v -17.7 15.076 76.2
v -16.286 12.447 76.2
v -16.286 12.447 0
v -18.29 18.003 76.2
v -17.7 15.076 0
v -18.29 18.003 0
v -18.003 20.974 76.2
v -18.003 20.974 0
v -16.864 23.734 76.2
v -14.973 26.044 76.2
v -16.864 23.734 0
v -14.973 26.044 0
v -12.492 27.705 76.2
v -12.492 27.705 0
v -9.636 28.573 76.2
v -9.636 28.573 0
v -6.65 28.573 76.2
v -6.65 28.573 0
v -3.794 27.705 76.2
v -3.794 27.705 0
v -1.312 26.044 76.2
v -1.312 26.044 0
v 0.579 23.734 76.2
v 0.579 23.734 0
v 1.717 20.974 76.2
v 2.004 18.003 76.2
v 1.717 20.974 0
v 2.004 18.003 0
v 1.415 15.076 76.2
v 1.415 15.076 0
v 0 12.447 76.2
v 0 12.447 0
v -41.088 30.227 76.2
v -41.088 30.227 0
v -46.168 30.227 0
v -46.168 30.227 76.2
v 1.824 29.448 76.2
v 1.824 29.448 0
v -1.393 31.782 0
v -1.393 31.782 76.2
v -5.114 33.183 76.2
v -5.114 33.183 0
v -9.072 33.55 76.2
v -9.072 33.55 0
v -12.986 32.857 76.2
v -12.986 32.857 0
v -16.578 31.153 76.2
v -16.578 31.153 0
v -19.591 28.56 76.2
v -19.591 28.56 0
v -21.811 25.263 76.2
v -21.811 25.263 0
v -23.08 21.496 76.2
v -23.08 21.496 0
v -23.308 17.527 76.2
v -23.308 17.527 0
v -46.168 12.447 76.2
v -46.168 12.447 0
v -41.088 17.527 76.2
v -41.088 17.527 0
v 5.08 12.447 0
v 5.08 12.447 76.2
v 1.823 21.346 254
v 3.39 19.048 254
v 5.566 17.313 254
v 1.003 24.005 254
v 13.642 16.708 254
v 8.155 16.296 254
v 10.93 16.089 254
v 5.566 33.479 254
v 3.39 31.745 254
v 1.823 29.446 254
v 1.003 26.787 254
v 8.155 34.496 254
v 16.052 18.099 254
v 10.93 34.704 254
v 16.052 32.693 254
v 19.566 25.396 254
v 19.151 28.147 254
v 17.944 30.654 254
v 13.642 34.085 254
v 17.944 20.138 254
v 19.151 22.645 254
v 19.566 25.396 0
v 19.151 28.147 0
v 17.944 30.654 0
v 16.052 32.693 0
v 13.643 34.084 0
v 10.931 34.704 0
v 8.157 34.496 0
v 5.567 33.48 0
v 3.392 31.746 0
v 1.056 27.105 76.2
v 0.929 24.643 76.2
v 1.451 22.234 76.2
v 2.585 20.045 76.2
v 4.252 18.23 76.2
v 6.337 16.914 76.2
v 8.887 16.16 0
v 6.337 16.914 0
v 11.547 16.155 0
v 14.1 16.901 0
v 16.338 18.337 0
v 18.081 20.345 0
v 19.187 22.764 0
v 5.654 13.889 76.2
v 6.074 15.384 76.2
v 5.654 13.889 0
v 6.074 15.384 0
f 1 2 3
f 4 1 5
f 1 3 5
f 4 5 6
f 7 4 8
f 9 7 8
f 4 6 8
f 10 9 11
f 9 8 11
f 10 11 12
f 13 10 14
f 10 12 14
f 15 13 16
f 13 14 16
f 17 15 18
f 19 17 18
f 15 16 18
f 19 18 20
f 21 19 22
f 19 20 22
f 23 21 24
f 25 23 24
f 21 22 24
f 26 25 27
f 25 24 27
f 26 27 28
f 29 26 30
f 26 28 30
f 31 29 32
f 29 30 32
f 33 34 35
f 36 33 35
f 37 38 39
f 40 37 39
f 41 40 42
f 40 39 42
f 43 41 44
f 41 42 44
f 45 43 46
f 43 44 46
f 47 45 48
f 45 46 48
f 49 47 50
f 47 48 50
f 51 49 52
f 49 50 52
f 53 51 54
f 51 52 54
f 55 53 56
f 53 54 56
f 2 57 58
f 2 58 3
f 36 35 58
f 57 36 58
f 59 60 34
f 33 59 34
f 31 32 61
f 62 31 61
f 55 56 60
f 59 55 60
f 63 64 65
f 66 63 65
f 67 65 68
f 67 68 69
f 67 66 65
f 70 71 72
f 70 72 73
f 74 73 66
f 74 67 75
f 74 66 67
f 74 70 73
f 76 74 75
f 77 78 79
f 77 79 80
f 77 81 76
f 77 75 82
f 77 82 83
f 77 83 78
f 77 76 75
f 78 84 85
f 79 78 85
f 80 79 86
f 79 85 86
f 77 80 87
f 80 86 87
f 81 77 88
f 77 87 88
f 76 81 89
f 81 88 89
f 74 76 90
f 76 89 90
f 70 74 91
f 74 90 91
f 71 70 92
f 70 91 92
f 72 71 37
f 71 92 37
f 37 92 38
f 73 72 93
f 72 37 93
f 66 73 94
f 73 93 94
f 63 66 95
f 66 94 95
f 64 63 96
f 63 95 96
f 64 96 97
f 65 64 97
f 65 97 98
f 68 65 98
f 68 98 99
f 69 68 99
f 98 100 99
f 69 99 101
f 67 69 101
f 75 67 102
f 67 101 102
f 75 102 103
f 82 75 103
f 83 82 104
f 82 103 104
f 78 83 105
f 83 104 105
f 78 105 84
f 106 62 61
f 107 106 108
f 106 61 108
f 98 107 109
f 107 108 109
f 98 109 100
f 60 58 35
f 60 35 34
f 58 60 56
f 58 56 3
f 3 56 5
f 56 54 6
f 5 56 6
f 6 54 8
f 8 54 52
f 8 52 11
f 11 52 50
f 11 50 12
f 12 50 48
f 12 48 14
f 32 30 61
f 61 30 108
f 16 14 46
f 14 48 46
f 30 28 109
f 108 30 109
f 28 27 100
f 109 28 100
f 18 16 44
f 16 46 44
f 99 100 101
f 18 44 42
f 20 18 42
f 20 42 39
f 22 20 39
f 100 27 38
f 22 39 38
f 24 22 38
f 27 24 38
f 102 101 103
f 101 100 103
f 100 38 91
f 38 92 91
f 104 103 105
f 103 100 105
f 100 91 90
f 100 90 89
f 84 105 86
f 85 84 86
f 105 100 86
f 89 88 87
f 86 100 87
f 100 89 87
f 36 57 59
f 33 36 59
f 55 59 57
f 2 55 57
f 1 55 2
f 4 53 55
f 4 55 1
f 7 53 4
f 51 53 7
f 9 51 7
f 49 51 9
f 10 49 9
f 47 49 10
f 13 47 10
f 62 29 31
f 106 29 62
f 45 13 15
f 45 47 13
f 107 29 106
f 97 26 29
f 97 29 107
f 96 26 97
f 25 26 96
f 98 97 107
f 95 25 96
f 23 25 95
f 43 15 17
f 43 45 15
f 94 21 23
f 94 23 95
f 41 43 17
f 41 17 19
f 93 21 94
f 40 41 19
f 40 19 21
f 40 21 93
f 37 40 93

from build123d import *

# Parameters (mm, degrees)
F1_DEPTH = 76.2
F2_R     = 9.333674
F3_DEPTH = 254


with BuildPart() as f1:
    # F0 (on Top) → F1 (new body)
    with BuildSketch(Plane.XY):
        with BuildLine():
            Line((-41.087765, 30.226878), (-46.167765, 30.226878))
            Line((-46.167765, 30.226878), (-46.167765, 12.446878))
            Line((-46.167765, 12.446878), (-16.285702, 12.446878))
            ThreePointArc((-16.285702, 12.446878), (-8.142851, 28.683026), (0, 12.446878))
            Line((0, 12.446878), (5.08, 12.446878))
            ThreePointArc((5.08, 12.446878), (-5.831418, 33.329758), (-23.307765, 17.526878))
            Line((-23.307765, 17.526878), (-41.087765, 17.526878))
            Line((-41.087765, 17.526878), (-41.087765, 30.226878))
        make_face()
    extrude(amount=F1_DEPTH)

    # F2 (on Top) → F3 (join)
    with BuildSketch(Plane.XY):
        with Locations((10.232405, 25.396086)):
            Circle(F2_R)
    extrude(amount=F3_DEPTH)


solid = f1.part
